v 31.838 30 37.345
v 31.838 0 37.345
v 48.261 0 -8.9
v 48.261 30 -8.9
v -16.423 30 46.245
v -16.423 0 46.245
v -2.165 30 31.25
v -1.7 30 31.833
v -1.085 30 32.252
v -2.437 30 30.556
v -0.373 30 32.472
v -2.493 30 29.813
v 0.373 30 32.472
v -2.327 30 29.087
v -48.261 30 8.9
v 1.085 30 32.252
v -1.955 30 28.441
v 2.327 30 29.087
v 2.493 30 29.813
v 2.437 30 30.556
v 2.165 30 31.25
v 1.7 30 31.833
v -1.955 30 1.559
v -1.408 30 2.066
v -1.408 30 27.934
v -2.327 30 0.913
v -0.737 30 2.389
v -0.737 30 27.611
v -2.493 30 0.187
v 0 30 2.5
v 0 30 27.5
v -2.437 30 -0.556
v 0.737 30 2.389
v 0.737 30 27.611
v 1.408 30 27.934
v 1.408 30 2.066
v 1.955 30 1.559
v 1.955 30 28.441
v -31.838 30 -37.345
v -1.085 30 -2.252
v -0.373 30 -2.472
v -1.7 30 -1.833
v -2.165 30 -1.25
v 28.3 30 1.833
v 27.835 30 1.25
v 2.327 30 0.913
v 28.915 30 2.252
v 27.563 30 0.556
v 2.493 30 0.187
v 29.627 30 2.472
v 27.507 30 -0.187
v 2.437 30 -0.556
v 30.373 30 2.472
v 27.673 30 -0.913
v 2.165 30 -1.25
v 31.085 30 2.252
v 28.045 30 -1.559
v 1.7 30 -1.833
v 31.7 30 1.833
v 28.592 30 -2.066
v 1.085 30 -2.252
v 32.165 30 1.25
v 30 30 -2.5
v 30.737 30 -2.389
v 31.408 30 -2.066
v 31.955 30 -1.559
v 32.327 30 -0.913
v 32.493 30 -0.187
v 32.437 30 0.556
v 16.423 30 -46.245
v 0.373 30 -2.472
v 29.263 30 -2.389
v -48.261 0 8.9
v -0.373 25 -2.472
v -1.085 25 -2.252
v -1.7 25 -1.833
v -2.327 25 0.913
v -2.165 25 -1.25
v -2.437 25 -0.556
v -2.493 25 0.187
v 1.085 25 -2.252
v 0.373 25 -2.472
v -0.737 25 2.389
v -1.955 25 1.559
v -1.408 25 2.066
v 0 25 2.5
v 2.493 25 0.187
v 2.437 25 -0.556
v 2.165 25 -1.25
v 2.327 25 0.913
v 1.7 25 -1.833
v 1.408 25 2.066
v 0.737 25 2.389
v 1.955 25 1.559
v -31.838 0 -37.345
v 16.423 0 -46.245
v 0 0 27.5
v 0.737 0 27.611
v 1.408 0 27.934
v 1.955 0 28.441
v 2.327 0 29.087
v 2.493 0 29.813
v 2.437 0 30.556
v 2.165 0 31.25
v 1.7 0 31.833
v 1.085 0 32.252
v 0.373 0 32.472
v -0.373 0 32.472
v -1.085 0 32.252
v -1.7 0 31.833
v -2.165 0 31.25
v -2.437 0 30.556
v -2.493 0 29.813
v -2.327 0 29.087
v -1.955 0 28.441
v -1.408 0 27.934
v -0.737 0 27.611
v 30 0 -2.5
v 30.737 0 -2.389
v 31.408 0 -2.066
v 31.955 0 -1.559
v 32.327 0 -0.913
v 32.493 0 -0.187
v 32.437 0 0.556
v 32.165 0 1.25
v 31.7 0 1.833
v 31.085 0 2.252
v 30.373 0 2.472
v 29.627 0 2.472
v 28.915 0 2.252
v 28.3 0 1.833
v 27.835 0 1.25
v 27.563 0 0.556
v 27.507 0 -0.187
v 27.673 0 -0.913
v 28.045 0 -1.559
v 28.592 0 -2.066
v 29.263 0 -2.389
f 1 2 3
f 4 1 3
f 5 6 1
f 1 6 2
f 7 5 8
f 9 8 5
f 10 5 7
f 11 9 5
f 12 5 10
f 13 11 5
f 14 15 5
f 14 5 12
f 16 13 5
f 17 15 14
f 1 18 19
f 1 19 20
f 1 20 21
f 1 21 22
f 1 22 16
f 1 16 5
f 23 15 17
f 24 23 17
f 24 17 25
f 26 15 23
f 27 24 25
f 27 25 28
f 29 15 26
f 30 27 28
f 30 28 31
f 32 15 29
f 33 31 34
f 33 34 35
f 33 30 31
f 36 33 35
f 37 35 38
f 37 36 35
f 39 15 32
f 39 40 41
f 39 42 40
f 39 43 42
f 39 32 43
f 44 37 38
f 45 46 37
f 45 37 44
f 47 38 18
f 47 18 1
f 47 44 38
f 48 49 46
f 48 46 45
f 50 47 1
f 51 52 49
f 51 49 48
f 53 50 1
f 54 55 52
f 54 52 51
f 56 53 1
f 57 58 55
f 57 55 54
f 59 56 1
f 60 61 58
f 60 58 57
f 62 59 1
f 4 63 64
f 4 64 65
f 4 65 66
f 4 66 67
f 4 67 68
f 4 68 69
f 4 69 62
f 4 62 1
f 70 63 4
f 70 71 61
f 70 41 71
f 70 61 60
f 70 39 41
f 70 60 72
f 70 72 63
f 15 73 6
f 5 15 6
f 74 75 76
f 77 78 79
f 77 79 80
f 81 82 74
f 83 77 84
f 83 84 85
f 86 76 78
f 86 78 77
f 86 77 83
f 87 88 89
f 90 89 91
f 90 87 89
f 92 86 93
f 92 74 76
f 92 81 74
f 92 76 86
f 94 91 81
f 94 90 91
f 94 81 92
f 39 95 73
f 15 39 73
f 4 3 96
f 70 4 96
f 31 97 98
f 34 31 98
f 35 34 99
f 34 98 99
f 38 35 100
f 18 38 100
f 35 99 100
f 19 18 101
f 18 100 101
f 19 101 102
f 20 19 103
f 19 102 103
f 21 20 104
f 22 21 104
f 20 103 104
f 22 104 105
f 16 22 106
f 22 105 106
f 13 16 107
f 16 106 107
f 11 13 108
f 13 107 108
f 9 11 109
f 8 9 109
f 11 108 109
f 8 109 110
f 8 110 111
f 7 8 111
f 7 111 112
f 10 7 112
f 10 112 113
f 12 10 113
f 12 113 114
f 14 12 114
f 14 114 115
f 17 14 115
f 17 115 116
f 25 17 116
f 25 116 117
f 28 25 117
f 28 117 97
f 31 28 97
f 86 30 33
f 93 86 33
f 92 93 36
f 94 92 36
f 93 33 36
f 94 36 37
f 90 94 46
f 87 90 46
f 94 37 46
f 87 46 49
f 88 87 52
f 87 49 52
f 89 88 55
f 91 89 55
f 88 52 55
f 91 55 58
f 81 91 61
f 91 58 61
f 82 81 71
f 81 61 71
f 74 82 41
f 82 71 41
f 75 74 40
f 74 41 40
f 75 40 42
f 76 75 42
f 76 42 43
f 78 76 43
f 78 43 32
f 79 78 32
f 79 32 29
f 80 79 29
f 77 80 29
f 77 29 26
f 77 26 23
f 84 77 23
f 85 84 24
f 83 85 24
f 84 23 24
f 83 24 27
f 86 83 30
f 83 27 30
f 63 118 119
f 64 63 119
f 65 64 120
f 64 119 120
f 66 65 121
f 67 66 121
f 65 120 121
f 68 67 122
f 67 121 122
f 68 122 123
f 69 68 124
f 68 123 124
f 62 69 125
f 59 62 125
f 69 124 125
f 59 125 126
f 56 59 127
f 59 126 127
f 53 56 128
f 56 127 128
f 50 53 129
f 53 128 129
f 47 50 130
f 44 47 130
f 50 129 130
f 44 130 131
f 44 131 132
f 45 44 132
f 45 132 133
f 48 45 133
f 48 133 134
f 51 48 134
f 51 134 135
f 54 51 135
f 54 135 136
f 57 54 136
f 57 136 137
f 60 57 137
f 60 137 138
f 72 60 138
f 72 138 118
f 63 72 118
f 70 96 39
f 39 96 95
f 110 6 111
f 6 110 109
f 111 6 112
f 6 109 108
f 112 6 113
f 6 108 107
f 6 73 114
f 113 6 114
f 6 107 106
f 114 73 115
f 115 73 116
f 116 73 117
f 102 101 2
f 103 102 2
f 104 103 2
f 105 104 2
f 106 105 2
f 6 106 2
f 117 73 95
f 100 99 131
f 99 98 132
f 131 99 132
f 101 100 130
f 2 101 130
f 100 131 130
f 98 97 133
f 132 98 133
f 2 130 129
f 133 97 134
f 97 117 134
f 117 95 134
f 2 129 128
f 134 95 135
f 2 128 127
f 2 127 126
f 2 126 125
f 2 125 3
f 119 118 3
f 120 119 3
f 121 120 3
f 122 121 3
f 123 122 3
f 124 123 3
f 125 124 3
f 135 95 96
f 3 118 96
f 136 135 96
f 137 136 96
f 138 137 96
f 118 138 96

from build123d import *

# Parameters (mm, degrees)
SALIENTE_EXTRUIR1_DEPTH = 30
CROQUIS2_R              = 2.5
CORTAR_EXTRUIR1_DEPTH   = 5
CROQUIS3_R              = 2.5
CORTAR_EXTRUIR2_DEPTH   = 74.264929004


with BuildPart() as part:
    # Croquis1 → Saliente-Extruir1 (new body)
    with BuildSketch(Plane(origin=(0, 0, 0), x_dir=(1, 0, 0), z_dir=(0, 1, 0))):
        Polygon((-31.838337555, 37.345061187), (-48.260940471, -8.900278543), (-16.422602917, -46.24533973), (31.838337555, -37.345061187), (48.260940471, 8.900278543), (16.422602917, 46.24533973), align=None)
    extrude(amount=SALIENTE_EXTRUIR1_DEPTH)

    # Croquis2 → Cortar-Extruir1 (cut)
    with BuildSketch(Plane(origin=(0, 30, 0), x_dir=(1, 0, 0), z_dir=(0, 1, 0))):
        with Locations(Location((0, 0, 0), (0, 0, 270))):
            Circle(CROQUIS2_R)
    extrude(amount=-CORTAR_EXTRUIR1_DEPTH, mode=Mode.SUBTRACT)

    # Croquis3 → Cortar-Extruir2 (cut, through all)
    with BuildSketch(Plane.XZ):
        with Locations(Location((0, 30, 0), (0, 0, 270))):
            Circle(CROQUIS3_R)
        with Locations(Location((30, 0, 0), (0, 0, 270))):
            Circle(CROQUIS3_R)
    extrude(amount=-CORTAR_EXTRUIR2_DEPTH, mode=Mode.SUBTRACT)


solid = part.part
